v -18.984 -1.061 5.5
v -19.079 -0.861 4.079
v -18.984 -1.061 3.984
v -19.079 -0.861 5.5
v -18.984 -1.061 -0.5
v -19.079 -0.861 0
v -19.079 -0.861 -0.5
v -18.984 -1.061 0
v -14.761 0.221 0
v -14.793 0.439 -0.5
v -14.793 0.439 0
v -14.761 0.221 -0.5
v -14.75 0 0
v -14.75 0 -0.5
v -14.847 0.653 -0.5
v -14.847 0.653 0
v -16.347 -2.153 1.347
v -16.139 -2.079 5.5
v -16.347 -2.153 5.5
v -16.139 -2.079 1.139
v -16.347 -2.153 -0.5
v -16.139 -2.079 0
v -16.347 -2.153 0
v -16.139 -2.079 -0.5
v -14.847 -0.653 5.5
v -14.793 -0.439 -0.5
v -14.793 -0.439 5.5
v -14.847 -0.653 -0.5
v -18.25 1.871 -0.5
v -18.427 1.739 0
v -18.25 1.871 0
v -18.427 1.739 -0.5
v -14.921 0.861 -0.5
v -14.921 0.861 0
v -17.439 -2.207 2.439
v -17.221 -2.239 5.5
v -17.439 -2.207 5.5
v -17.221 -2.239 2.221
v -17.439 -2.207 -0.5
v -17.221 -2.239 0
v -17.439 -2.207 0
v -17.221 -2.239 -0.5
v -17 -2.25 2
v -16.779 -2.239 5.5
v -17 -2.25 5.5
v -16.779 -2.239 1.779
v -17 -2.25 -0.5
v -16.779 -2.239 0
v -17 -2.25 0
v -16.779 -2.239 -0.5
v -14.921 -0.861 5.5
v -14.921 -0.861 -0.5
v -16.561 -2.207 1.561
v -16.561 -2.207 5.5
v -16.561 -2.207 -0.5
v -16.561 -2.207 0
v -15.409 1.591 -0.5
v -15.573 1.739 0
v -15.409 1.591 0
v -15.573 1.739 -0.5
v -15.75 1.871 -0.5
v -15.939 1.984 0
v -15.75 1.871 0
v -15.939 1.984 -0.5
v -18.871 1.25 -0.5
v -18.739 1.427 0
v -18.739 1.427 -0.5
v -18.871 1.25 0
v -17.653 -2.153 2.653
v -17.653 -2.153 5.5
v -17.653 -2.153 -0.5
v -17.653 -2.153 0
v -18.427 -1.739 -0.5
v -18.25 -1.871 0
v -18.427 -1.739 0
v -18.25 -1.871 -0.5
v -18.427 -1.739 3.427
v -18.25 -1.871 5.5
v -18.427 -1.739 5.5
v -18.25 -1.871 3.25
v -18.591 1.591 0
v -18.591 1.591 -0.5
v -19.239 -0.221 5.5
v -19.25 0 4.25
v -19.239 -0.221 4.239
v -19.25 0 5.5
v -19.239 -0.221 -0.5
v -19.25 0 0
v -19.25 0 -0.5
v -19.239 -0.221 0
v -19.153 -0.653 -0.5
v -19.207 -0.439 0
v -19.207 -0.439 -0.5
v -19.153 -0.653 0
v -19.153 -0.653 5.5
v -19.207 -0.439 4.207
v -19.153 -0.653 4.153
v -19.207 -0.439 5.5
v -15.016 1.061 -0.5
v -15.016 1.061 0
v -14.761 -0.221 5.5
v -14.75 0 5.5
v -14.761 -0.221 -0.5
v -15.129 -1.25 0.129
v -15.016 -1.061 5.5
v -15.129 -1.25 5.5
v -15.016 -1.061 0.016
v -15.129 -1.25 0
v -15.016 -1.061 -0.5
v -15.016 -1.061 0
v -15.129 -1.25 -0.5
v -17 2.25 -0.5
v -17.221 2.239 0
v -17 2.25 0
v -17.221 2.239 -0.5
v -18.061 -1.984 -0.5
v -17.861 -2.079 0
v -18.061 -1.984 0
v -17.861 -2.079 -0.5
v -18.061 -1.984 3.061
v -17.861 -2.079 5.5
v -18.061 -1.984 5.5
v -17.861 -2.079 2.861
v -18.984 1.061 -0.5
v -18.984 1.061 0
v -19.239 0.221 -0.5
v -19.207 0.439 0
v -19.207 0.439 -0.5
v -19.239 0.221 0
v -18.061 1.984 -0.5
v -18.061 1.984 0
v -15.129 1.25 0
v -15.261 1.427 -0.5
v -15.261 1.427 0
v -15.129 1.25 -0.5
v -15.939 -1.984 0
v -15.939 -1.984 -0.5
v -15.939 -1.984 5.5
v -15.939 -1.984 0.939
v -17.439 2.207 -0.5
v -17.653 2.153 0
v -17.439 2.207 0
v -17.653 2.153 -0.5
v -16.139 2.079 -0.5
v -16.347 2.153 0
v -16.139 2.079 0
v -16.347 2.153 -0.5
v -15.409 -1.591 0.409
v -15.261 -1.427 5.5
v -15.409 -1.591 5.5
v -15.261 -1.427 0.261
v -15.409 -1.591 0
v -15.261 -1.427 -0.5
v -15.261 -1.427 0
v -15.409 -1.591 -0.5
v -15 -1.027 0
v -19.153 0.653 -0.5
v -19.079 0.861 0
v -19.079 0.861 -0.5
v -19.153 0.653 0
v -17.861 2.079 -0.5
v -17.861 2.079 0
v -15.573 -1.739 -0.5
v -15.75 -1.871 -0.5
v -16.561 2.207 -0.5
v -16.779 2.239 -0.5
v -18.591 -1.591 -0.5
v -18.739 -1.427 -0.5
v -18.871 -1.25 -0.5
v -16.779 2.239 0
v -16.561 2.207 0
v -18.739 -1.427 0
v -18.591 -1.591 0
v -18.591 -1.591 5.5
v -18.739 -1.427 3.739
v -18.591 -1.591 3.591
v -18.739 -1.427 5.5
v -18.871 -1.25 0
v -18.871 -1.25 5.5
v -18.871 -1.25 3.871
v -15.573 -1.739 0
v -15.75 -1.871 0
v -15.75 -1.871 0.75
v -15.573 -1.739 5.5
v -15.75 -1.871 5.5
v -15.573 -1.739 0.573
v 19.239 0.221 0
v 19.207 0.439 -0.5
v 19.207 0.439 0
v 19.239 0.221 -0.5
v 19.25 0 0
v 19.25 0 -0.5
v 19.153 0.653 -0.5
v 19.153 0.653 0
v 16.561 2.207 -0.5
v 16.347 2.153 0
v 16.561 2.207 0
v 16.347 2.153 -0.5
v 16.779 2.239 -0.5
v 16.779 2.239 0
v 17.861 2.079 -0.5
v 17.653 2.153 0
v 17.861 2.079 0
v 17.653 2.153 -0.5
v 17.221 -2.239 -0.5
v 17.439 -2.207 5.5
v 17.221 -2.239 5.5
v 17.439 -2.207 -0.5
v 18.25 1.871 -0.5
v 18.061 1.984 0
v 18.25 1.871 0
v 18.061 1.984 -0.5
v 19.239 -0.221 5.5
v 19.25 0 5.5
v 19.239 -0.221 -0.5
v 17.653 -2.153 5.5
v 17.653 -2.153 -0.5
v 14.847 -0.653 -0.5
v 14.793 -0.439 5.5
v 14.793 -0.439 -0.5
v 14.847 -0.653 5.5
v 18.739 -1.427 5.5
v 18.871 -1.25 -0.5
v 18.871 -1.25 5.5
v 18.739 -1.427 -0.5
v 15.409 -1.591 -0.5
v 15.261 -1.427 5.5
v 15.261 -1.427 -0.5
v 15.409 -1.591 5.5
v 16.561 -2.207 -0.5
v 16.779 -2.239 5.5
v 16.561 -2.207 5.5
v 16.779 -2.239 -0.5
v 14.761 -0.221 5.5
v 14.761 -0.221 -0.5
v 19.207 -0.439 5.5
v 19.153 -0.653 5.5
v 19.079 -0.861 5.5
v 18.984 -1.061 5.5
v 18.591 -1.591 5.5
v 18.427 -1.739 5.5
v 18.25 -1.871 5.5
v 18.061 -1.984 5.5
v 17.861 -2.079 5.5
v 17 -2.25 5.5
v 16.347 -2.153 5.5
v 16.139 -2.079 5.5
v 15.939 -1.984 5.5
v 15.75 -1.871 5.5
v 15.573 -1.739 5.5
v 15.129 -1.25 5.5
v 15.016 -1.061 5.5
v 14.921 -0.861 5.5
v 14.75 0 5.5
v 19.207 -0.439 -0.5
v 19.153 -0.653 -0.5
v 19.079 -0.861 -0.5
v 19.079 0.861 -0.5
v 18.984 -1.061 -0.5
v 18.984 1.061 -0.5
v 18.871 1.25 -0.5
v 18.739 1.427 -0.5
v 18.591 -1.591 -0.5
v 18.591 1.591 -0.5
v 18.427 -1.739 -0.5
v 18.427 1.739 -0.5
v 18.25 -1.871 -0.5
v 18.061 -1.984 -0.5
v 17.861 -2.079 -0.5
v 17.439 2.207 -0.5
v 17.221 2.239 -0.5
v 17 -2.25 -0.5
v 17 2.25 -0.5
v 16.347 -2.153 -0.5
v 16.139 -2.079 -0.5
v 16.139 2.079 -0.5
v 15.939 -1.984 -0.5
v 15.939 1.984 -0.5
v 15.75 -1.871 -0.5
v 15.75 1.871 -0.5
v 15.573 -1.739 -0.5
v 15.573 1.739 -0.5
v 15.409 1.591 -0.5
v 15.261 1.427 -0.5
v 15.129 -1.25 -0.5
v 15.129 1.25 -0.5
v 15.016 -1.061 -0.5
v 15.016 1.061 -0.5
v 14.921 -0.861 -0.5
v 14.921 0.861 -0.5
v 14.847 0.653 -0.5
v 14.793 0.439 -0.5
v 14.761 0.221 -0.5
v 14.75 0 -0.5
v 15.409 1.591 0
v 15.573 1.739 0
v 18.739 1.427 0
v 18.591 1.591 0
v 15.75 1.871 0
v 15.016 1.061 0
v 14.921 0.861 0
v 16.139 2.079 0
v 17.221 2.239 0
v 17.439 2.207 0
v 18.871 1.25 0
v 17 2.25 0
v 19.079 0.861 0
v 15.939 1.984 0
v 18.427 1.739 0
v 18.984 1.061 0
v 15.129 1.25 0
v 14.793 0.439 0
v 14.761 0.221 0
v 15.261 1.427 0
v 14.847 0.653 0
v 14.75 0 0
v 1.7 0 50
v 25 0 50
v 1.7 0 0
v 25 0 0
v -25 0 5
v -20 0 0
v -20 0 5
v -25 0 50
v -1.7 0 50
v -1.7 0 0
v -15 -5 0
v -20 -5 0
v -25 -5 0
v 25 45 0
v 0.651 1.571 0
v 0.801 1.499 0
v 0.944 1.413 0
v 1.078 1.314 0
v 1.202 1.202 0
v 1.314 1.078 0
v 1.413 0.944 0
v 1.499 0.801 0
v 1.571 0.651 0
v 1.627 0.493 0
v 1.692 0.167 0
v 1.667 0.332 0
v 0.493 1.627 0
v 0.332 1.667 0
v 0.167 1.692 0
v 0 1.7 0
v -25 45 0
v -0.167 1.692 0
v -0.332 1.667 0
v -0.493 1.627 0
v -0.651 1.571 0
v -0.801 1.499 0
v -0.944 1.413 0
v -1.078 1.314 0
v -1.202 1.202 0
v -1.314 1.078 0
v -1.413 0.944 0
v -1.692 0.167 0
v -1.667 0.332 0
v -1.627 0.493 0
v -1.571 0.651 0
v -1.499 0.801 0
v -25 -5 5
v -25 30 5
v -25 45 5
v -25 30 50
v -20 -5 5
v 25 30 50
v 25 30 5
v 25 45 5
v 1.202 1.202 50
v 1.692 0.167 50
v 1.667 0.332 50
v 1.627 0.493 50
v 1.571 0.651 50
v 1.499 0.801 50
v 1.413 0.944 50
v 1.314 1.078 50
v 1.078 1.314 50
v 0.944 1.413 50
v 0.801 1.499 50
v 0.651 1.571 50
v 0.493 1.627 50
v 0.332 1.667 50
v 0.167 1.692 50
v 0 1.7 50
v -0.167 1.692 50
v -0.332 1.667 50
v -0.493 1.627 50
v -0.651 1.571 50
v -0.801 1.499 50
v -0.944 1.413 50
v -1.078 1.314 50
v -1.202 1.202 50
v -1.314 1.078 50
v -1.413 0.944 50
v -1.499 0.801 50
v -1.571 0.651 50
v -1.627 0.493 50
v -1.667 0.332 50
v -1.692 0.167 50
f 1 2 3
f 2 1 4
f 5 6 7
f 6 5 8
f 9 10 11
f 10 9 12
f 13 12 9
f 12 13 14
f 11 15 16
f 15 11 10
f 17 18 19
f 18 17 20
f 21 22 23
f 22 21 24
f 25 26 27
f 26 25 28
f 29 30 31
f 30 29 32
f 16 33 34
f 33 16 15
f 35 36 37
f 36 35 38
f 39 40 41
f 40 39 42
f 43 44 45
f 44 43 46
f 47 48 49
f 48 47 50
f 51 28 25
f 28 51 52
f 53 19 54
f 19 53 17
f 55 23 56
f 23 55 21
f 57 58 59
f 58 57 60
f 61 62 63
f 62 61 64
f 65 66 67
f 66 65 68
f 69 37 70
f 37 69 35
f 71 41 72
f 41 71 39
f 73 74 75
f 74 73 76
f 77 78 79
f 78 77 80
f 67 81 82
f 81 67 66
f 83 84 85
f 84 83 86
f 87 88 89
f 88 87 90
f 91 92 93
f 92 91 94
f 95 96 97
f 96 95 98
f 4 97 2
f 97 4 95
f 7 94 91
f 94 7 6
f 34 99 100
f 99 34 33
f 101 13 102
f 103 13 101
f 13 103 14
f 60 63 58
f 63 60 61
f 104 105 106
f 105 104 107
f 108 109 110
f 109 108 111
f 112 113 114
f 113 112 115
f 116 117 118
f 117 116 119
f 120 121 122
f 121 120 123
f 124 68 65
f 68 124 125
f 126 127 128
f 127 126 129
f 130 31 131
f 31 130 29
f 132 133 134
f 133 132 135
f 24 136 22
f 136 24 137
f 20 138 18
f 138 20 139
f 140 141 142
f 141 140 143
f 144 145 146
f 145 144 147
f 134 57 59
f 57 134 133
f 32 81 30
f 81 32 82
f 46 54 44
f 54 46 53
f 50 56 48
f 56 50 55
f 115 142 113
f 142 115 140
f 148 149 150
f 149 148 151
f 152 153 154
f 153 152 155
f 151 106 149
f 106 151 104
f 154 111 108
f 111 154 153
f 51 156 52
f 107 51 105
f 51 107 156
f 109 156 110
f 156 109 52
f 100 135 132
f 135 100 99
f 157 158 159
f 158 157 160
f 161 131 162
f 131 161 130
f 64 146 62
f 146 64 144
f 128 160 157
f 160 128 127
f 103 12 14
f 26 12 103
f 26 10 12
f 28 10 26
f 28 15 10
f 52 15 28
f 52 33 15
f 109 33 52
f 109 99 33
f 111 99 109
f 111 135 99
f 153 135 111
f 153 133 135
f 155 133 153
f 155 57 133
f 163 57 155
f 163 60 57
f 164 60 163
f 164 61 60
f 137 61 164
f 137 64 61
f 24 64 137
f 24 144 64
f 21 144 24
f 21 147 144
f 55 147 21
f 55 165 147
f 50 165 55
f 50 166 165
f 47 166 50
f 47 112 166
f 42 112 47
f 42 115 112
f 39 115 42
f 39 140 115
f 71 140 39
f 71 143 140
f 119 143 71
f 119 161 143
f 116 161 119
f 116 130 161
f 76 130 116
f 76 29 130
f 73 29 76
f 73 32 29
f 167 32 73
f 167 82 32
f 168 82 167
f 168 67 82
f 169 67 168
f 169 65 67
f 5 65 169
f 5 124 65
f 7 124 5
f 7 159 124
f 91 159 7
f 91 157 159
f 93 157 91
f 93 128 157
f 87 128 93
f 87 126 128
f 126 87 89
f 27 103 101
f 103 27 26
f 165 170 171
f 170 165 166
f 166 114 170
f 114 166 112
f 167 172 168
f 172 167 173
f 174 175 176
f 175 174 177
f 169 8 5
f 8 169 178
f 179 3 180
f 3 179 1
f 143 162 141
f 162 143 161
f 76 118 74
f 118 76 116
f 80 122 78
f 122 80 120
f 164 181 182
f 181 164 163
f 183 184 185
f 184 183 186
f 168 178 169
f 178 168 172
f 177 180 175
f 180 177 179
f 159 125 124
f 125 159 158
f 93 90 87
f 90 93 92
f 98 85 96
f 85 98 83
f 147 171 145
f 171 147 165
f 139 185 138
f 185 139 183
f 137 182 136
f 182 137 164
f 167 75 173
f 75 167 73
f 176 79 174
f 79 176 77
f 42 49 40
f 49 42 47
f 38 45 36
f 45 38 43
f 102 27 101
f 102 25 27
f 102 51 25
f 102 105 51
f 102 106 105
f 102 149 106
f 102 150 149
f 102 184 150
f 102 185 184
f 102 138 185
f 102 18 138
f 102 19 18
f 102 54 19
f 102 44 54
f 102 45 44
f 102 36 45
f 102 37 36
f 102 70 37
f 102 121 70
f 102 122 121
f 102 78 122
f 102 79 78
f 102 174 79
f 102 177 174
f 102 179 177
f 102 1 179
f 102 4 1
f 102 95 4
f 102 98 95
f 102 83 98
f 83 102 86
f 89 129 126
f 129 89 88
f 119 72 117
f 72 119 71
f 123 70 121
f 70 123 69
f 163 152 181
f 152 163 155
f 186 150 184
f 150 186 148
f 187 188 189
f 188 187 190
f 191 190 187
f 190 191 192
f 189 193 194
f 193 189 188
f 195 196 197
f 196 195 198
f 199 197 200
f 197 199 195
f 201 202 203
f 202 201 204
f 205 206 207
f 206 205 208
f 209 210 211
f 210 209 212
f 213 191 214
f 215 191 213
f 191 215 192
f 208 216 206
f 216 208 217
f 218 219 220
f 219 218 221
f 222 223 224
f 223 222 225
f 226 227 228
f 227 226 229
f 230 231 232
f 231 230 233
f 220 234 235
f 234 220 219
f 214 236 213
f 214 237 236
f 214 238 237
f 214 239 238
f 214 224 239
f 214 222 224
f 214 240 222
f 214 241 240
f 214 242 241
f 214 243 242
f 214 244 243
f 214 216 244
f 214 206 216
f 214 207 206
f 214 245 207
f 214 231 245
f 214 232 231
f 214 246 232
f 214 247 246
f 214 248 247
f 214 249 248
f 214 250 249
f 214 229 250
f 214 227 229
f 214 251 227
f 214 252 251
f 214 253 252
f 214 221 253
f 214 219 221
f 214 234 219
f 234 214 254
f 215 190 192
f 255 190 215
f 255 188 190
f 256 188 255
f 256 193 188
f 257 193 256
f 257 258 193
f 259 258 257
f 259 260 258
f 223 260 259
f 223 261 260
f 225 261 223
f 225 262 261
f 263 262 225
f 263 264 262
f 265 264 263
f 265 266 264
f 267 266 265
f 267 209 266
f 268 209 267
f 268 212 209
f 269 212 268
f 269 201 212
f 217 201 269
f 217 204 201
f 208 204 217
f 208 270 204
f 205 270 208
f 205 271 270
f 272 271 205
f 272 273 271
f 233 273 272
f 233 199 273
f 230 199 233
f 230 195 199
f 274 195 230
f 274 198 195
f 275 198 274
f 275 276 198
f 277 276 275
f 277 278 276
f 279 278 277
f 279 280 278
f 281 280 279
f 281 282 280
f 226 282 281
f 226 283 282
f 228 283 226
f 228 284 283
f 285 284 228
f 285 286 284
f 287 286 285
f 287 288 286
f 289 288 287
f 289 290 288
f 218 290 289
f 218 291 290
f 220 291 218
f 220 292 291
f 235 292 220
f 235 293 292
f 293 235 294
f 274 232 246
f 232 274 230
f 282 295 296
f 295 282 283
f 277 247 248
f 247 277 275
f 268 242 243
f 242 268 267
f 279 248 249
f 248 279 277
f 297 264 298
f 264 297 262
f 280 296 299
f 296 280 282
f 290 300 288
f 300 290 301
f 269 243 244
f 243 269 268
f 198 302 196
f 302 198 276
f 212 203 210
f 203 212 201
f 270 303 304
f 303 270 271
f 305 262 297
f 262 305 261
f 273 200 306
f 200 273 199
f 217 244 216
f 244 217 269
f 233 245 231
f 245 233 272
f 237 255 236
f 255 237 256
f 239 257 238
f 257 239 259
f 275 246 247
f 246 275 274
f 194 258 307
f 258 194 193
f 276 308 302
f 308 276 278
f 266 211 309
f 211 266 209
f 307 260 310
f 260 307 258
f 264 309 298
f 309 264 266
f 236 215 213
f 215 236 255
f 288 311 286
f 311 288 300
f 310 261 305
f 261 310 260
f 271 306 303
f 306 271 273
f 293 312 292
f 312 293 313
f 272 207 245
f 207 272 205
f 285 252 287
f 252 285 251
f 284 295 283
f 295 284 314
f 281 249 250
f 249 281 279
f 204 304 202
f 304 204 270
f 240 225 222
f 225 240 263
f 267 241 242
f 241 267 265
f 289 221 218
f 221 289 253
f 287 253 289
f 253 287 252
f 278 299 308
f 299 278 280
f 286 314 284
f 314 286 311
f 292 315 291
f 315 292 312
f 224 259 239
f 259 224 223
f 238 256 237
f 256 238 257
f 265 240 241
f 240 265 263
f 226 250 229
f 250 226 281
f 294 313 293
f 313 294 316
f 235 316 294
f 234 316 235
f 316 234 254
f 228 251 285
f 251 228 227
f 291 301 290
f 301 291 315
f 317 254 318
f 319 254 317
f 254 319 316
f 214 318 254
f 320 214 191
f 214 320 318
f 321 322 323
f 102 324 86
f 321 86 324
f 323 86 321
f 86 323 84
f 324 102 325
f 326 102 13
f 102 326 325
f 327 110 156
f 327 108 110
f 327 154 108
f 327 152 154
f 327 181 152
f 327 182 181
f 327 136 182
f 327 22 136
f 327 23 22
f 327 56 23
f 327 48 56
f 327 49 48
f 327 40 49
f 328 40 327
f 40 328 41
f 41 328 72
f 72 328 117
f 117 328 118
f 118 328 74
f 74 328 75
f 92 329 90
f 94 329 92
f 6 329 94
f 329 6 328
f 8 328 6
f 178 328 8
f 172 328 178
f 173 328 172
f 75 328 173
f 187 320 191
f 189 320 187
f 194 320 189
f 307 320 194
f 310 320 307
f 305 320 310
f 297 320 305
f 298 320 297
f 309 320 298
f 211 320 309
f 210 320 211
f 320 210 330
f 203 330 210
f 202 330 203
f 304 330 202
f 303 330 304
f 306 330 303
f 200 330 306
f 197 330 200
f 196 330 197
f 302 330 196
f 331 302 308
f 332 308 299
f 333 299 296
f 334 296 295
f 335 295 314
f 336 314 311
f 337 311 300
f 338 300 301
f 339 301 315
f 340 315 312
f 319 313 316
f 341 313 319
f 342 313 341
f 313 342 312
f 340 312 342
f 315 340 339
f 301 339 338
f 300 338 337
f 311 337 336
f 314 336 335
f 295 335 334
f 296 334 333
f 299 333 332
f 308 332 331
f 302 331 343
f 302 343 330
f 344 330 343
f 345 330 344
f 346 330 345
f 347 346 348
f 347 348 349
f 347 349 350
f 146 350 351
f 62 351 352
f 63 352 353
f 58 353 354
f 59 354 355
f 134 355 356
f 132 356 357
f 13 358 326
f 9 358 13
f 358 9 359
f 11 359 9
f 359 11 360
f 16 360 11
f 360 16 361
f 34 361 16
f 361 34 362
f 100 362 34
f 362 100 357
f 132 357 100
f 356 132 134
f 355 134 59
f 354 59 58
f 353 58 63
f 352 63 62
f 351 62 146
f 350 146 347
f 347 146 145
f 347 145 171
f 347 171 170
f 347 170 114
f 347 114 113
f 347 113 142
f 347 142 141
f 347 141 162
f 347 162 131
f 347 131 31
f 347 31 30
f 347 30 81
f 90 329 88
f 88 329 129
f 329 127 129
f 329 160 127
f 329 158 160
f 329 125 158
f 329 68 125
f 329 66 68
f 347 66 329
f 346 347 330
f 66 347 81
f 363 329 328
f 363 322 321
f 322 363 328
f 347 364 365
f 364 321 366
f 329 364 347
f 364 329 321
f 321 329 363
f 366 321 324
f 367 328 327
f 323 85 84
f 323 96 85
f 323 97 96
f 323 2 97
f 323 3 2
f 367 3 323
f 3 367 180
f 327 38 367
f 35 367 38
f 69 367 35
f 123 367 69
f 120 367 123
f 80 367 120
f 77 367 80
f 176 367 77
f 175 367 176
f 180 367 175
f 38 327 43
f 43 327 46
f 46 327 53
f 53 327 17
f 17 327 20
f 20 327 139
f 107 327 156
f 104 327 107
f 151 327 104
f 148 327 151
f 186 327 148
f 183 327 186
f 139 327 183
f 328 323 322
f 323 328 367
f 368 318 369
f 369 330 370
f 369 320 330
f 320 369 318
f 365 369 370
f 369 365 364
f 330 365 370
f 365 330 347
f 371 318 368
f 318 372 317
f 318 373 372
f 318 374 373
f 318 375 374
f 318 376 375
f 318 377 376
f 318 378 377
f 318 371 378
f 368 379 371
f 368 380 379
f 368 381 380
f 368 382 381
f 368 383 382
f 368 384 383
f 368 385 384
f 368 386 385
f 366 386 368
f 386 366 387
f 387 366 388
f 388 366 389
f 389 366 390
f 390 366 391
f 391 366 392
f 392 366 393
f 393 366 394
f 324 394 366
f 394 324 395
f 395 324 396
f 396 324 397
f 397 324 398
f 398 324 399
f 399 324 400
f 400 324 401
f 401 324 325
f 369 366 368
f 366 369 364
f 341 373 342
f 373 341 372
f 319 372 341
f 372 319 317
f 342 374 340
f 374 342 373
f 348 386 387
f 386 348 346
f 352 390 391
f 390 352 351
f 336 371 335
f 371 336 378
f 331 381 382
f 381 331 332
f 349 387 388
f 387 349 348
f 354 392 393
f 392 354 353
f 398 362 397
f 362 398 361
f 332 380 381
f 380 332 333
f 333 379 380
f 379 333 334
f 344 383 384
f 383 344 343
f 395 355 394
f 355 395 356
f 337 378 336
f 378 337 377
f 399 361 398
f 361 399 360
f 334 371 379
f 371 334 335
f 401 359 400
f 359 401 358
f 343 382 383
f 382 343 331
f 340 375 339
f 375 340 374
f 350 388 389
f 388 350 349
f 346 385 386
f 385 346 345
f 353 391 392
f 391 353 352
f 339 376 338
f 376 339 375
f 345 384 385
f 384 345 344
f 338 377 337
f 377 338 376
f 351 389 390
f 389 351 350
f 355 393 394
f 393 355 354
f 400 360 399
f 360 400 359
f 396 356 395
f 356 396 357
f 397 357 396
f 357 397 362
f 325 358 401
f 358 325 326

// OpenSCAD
// L-shaped mounting bracket for NEMA 17 stepper motor (e.g. syringe pump)
// Print orientation: base plate on bed, motor plate building up in +Z

$fn = 64;

// ---- Base plate ----
base_x_min = -25;   // base plate X start
base_x_max = 25;    // base plate X end
base_y_min = 0;     // base plate Y start
base_y_max = 45;    // base plate Y end
base_z_max = 5;     // base plate thickness

// ---- Motor plate ----
motor_x_min = -25;  // motor plate X start
motor_x_max = 25;  // motor plate X end
motor_y_min = 0;   // motor plate Y start
motor_y_max = 5;   // motor plate Y end (on back edge of base)
motor_z_max = 50;  // motor plate height

// ---- Boss hole ----
boss_d = 23;        // motor boss hole diameter
boss_x = 0;         // boss hole X centre
boss_z = 28;        // boss hole Z centre

// ---- Screw holes ----
screw_d = 3.4;      // M3 screw hole diameter
screw_pattern = 31; // square pattern side length

// ---- Gussets ----
gusset_x_min = -25; // left gusset X start
gusset_x_max = -20; // left gusset X end
gusset_y_max = 5;   // gusset leg along Y
gusset_z_max = 5;   // gusset leg along Z
gusset_t = 5;       // gusset thickness (X direction)

// ---- Cutting overlap ----
eps = 0.5;          // extension past cut faces

difference() {
    union() {
        // Base plate with two vertical through-holes (M4)
        translate([base_x_min, base_y_min, 0])
            cube([base_x_max - base_x_min, base_y_max - base_y_min, base_z_max]);
        for (sx = [-17, 17])
            translate([sx, base_y_min, -eps])
                cylinder(d = 4.5, h = base_z_max + 2 * eps);

        // Vertical motor plate standing on back edge of base
        translate([motor_x_min, motor_y_min, 0])
            cube([motor_x_max - motor_x_min, motor_y_max - motor_x_min, motor_z_max]);

        // Triangular gussets flush with left and right edges
        for (sx = [gusset_x_min, gusset_x_max])
            translate([sx, 0, 0])
                rotate([90, 0, 0])
                    linear_extrude(height = gusset_t)
                        polygon(points = [[0, 0], [gusset_y_max, 0], [0, gusset_z_max]]);
    }

    // Boss hole through motor plate along Y
    translate([boss_x, motor_y_min - eps, boss_z])
        rotate([90, 0, 0])
            cylinder(d = boss_d, h = motor_y_max - motor_y_min + 2 * eps);

    // Four M3 screw holes on 31 mm square pattern centred on boss hole
    for (a = [0, 90, 180, 270])
        rotate([0, 0, a])
            translate([0, 0, -eps])
                cylinder(d = screw_d, h = motor_z_max + 2 * eps);
}
